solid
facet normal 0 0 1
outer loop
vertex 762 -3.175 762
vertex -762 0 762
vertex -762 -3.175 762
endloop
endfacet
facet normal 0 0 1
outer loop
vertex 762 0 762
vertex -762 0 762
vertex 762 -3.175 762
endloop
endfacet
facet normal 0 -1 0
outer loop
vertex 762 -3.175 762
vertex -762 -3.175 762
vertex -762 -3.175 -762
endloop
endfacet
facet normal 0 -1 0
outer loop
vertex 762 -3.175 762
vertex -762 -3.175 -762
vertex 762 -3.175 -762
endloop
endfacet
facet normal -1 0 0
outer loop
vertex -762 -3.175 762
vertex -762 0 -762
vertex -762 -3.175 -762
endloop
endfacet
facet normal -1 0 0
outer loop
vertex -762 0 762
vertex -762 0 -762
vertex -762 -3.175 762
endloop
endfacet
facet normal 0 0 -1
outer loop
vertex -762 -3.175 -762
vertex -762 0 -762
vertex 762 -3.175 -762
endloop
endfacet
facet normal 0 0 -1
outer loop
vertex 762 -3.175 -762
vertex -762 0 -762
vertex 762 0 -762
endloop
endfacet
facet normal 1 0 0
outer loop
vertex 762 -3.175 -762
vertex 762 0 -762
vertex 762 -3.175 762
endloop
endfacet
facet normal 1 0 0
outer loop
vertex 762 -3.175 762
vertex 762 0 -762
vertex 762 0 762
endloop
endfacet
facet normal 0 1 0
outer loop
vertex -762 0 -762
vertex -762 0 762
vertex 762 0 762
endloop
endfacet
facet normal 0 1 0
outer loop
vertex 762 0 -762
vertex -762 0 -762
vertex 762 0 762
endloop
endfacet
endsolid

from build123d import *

# Parameters (mm, degrees)
F0_W     = 1651
F0_H     = 1651
F1_DEPTH = 3.175
F3_W     = 1524
F3_H     = 1524
F4_DEPTH = 3.175


with BuildPart() as f1:
    # F0 (on Front) → F1 (new body)
    with BuildSketch(Plane.XZ):
        Rectangle(F0_W, F0_H)
    extrude(amount=F1_DEPTH)


with BuildPart() as f4:
    # F3 (on Front) → F4 (new body)
    with BuildSketch(Plane.XZ):
        Rectangle(F3_W, F3_H)
    extrude(amount=F4_DEPTH)


solid = f4.part
